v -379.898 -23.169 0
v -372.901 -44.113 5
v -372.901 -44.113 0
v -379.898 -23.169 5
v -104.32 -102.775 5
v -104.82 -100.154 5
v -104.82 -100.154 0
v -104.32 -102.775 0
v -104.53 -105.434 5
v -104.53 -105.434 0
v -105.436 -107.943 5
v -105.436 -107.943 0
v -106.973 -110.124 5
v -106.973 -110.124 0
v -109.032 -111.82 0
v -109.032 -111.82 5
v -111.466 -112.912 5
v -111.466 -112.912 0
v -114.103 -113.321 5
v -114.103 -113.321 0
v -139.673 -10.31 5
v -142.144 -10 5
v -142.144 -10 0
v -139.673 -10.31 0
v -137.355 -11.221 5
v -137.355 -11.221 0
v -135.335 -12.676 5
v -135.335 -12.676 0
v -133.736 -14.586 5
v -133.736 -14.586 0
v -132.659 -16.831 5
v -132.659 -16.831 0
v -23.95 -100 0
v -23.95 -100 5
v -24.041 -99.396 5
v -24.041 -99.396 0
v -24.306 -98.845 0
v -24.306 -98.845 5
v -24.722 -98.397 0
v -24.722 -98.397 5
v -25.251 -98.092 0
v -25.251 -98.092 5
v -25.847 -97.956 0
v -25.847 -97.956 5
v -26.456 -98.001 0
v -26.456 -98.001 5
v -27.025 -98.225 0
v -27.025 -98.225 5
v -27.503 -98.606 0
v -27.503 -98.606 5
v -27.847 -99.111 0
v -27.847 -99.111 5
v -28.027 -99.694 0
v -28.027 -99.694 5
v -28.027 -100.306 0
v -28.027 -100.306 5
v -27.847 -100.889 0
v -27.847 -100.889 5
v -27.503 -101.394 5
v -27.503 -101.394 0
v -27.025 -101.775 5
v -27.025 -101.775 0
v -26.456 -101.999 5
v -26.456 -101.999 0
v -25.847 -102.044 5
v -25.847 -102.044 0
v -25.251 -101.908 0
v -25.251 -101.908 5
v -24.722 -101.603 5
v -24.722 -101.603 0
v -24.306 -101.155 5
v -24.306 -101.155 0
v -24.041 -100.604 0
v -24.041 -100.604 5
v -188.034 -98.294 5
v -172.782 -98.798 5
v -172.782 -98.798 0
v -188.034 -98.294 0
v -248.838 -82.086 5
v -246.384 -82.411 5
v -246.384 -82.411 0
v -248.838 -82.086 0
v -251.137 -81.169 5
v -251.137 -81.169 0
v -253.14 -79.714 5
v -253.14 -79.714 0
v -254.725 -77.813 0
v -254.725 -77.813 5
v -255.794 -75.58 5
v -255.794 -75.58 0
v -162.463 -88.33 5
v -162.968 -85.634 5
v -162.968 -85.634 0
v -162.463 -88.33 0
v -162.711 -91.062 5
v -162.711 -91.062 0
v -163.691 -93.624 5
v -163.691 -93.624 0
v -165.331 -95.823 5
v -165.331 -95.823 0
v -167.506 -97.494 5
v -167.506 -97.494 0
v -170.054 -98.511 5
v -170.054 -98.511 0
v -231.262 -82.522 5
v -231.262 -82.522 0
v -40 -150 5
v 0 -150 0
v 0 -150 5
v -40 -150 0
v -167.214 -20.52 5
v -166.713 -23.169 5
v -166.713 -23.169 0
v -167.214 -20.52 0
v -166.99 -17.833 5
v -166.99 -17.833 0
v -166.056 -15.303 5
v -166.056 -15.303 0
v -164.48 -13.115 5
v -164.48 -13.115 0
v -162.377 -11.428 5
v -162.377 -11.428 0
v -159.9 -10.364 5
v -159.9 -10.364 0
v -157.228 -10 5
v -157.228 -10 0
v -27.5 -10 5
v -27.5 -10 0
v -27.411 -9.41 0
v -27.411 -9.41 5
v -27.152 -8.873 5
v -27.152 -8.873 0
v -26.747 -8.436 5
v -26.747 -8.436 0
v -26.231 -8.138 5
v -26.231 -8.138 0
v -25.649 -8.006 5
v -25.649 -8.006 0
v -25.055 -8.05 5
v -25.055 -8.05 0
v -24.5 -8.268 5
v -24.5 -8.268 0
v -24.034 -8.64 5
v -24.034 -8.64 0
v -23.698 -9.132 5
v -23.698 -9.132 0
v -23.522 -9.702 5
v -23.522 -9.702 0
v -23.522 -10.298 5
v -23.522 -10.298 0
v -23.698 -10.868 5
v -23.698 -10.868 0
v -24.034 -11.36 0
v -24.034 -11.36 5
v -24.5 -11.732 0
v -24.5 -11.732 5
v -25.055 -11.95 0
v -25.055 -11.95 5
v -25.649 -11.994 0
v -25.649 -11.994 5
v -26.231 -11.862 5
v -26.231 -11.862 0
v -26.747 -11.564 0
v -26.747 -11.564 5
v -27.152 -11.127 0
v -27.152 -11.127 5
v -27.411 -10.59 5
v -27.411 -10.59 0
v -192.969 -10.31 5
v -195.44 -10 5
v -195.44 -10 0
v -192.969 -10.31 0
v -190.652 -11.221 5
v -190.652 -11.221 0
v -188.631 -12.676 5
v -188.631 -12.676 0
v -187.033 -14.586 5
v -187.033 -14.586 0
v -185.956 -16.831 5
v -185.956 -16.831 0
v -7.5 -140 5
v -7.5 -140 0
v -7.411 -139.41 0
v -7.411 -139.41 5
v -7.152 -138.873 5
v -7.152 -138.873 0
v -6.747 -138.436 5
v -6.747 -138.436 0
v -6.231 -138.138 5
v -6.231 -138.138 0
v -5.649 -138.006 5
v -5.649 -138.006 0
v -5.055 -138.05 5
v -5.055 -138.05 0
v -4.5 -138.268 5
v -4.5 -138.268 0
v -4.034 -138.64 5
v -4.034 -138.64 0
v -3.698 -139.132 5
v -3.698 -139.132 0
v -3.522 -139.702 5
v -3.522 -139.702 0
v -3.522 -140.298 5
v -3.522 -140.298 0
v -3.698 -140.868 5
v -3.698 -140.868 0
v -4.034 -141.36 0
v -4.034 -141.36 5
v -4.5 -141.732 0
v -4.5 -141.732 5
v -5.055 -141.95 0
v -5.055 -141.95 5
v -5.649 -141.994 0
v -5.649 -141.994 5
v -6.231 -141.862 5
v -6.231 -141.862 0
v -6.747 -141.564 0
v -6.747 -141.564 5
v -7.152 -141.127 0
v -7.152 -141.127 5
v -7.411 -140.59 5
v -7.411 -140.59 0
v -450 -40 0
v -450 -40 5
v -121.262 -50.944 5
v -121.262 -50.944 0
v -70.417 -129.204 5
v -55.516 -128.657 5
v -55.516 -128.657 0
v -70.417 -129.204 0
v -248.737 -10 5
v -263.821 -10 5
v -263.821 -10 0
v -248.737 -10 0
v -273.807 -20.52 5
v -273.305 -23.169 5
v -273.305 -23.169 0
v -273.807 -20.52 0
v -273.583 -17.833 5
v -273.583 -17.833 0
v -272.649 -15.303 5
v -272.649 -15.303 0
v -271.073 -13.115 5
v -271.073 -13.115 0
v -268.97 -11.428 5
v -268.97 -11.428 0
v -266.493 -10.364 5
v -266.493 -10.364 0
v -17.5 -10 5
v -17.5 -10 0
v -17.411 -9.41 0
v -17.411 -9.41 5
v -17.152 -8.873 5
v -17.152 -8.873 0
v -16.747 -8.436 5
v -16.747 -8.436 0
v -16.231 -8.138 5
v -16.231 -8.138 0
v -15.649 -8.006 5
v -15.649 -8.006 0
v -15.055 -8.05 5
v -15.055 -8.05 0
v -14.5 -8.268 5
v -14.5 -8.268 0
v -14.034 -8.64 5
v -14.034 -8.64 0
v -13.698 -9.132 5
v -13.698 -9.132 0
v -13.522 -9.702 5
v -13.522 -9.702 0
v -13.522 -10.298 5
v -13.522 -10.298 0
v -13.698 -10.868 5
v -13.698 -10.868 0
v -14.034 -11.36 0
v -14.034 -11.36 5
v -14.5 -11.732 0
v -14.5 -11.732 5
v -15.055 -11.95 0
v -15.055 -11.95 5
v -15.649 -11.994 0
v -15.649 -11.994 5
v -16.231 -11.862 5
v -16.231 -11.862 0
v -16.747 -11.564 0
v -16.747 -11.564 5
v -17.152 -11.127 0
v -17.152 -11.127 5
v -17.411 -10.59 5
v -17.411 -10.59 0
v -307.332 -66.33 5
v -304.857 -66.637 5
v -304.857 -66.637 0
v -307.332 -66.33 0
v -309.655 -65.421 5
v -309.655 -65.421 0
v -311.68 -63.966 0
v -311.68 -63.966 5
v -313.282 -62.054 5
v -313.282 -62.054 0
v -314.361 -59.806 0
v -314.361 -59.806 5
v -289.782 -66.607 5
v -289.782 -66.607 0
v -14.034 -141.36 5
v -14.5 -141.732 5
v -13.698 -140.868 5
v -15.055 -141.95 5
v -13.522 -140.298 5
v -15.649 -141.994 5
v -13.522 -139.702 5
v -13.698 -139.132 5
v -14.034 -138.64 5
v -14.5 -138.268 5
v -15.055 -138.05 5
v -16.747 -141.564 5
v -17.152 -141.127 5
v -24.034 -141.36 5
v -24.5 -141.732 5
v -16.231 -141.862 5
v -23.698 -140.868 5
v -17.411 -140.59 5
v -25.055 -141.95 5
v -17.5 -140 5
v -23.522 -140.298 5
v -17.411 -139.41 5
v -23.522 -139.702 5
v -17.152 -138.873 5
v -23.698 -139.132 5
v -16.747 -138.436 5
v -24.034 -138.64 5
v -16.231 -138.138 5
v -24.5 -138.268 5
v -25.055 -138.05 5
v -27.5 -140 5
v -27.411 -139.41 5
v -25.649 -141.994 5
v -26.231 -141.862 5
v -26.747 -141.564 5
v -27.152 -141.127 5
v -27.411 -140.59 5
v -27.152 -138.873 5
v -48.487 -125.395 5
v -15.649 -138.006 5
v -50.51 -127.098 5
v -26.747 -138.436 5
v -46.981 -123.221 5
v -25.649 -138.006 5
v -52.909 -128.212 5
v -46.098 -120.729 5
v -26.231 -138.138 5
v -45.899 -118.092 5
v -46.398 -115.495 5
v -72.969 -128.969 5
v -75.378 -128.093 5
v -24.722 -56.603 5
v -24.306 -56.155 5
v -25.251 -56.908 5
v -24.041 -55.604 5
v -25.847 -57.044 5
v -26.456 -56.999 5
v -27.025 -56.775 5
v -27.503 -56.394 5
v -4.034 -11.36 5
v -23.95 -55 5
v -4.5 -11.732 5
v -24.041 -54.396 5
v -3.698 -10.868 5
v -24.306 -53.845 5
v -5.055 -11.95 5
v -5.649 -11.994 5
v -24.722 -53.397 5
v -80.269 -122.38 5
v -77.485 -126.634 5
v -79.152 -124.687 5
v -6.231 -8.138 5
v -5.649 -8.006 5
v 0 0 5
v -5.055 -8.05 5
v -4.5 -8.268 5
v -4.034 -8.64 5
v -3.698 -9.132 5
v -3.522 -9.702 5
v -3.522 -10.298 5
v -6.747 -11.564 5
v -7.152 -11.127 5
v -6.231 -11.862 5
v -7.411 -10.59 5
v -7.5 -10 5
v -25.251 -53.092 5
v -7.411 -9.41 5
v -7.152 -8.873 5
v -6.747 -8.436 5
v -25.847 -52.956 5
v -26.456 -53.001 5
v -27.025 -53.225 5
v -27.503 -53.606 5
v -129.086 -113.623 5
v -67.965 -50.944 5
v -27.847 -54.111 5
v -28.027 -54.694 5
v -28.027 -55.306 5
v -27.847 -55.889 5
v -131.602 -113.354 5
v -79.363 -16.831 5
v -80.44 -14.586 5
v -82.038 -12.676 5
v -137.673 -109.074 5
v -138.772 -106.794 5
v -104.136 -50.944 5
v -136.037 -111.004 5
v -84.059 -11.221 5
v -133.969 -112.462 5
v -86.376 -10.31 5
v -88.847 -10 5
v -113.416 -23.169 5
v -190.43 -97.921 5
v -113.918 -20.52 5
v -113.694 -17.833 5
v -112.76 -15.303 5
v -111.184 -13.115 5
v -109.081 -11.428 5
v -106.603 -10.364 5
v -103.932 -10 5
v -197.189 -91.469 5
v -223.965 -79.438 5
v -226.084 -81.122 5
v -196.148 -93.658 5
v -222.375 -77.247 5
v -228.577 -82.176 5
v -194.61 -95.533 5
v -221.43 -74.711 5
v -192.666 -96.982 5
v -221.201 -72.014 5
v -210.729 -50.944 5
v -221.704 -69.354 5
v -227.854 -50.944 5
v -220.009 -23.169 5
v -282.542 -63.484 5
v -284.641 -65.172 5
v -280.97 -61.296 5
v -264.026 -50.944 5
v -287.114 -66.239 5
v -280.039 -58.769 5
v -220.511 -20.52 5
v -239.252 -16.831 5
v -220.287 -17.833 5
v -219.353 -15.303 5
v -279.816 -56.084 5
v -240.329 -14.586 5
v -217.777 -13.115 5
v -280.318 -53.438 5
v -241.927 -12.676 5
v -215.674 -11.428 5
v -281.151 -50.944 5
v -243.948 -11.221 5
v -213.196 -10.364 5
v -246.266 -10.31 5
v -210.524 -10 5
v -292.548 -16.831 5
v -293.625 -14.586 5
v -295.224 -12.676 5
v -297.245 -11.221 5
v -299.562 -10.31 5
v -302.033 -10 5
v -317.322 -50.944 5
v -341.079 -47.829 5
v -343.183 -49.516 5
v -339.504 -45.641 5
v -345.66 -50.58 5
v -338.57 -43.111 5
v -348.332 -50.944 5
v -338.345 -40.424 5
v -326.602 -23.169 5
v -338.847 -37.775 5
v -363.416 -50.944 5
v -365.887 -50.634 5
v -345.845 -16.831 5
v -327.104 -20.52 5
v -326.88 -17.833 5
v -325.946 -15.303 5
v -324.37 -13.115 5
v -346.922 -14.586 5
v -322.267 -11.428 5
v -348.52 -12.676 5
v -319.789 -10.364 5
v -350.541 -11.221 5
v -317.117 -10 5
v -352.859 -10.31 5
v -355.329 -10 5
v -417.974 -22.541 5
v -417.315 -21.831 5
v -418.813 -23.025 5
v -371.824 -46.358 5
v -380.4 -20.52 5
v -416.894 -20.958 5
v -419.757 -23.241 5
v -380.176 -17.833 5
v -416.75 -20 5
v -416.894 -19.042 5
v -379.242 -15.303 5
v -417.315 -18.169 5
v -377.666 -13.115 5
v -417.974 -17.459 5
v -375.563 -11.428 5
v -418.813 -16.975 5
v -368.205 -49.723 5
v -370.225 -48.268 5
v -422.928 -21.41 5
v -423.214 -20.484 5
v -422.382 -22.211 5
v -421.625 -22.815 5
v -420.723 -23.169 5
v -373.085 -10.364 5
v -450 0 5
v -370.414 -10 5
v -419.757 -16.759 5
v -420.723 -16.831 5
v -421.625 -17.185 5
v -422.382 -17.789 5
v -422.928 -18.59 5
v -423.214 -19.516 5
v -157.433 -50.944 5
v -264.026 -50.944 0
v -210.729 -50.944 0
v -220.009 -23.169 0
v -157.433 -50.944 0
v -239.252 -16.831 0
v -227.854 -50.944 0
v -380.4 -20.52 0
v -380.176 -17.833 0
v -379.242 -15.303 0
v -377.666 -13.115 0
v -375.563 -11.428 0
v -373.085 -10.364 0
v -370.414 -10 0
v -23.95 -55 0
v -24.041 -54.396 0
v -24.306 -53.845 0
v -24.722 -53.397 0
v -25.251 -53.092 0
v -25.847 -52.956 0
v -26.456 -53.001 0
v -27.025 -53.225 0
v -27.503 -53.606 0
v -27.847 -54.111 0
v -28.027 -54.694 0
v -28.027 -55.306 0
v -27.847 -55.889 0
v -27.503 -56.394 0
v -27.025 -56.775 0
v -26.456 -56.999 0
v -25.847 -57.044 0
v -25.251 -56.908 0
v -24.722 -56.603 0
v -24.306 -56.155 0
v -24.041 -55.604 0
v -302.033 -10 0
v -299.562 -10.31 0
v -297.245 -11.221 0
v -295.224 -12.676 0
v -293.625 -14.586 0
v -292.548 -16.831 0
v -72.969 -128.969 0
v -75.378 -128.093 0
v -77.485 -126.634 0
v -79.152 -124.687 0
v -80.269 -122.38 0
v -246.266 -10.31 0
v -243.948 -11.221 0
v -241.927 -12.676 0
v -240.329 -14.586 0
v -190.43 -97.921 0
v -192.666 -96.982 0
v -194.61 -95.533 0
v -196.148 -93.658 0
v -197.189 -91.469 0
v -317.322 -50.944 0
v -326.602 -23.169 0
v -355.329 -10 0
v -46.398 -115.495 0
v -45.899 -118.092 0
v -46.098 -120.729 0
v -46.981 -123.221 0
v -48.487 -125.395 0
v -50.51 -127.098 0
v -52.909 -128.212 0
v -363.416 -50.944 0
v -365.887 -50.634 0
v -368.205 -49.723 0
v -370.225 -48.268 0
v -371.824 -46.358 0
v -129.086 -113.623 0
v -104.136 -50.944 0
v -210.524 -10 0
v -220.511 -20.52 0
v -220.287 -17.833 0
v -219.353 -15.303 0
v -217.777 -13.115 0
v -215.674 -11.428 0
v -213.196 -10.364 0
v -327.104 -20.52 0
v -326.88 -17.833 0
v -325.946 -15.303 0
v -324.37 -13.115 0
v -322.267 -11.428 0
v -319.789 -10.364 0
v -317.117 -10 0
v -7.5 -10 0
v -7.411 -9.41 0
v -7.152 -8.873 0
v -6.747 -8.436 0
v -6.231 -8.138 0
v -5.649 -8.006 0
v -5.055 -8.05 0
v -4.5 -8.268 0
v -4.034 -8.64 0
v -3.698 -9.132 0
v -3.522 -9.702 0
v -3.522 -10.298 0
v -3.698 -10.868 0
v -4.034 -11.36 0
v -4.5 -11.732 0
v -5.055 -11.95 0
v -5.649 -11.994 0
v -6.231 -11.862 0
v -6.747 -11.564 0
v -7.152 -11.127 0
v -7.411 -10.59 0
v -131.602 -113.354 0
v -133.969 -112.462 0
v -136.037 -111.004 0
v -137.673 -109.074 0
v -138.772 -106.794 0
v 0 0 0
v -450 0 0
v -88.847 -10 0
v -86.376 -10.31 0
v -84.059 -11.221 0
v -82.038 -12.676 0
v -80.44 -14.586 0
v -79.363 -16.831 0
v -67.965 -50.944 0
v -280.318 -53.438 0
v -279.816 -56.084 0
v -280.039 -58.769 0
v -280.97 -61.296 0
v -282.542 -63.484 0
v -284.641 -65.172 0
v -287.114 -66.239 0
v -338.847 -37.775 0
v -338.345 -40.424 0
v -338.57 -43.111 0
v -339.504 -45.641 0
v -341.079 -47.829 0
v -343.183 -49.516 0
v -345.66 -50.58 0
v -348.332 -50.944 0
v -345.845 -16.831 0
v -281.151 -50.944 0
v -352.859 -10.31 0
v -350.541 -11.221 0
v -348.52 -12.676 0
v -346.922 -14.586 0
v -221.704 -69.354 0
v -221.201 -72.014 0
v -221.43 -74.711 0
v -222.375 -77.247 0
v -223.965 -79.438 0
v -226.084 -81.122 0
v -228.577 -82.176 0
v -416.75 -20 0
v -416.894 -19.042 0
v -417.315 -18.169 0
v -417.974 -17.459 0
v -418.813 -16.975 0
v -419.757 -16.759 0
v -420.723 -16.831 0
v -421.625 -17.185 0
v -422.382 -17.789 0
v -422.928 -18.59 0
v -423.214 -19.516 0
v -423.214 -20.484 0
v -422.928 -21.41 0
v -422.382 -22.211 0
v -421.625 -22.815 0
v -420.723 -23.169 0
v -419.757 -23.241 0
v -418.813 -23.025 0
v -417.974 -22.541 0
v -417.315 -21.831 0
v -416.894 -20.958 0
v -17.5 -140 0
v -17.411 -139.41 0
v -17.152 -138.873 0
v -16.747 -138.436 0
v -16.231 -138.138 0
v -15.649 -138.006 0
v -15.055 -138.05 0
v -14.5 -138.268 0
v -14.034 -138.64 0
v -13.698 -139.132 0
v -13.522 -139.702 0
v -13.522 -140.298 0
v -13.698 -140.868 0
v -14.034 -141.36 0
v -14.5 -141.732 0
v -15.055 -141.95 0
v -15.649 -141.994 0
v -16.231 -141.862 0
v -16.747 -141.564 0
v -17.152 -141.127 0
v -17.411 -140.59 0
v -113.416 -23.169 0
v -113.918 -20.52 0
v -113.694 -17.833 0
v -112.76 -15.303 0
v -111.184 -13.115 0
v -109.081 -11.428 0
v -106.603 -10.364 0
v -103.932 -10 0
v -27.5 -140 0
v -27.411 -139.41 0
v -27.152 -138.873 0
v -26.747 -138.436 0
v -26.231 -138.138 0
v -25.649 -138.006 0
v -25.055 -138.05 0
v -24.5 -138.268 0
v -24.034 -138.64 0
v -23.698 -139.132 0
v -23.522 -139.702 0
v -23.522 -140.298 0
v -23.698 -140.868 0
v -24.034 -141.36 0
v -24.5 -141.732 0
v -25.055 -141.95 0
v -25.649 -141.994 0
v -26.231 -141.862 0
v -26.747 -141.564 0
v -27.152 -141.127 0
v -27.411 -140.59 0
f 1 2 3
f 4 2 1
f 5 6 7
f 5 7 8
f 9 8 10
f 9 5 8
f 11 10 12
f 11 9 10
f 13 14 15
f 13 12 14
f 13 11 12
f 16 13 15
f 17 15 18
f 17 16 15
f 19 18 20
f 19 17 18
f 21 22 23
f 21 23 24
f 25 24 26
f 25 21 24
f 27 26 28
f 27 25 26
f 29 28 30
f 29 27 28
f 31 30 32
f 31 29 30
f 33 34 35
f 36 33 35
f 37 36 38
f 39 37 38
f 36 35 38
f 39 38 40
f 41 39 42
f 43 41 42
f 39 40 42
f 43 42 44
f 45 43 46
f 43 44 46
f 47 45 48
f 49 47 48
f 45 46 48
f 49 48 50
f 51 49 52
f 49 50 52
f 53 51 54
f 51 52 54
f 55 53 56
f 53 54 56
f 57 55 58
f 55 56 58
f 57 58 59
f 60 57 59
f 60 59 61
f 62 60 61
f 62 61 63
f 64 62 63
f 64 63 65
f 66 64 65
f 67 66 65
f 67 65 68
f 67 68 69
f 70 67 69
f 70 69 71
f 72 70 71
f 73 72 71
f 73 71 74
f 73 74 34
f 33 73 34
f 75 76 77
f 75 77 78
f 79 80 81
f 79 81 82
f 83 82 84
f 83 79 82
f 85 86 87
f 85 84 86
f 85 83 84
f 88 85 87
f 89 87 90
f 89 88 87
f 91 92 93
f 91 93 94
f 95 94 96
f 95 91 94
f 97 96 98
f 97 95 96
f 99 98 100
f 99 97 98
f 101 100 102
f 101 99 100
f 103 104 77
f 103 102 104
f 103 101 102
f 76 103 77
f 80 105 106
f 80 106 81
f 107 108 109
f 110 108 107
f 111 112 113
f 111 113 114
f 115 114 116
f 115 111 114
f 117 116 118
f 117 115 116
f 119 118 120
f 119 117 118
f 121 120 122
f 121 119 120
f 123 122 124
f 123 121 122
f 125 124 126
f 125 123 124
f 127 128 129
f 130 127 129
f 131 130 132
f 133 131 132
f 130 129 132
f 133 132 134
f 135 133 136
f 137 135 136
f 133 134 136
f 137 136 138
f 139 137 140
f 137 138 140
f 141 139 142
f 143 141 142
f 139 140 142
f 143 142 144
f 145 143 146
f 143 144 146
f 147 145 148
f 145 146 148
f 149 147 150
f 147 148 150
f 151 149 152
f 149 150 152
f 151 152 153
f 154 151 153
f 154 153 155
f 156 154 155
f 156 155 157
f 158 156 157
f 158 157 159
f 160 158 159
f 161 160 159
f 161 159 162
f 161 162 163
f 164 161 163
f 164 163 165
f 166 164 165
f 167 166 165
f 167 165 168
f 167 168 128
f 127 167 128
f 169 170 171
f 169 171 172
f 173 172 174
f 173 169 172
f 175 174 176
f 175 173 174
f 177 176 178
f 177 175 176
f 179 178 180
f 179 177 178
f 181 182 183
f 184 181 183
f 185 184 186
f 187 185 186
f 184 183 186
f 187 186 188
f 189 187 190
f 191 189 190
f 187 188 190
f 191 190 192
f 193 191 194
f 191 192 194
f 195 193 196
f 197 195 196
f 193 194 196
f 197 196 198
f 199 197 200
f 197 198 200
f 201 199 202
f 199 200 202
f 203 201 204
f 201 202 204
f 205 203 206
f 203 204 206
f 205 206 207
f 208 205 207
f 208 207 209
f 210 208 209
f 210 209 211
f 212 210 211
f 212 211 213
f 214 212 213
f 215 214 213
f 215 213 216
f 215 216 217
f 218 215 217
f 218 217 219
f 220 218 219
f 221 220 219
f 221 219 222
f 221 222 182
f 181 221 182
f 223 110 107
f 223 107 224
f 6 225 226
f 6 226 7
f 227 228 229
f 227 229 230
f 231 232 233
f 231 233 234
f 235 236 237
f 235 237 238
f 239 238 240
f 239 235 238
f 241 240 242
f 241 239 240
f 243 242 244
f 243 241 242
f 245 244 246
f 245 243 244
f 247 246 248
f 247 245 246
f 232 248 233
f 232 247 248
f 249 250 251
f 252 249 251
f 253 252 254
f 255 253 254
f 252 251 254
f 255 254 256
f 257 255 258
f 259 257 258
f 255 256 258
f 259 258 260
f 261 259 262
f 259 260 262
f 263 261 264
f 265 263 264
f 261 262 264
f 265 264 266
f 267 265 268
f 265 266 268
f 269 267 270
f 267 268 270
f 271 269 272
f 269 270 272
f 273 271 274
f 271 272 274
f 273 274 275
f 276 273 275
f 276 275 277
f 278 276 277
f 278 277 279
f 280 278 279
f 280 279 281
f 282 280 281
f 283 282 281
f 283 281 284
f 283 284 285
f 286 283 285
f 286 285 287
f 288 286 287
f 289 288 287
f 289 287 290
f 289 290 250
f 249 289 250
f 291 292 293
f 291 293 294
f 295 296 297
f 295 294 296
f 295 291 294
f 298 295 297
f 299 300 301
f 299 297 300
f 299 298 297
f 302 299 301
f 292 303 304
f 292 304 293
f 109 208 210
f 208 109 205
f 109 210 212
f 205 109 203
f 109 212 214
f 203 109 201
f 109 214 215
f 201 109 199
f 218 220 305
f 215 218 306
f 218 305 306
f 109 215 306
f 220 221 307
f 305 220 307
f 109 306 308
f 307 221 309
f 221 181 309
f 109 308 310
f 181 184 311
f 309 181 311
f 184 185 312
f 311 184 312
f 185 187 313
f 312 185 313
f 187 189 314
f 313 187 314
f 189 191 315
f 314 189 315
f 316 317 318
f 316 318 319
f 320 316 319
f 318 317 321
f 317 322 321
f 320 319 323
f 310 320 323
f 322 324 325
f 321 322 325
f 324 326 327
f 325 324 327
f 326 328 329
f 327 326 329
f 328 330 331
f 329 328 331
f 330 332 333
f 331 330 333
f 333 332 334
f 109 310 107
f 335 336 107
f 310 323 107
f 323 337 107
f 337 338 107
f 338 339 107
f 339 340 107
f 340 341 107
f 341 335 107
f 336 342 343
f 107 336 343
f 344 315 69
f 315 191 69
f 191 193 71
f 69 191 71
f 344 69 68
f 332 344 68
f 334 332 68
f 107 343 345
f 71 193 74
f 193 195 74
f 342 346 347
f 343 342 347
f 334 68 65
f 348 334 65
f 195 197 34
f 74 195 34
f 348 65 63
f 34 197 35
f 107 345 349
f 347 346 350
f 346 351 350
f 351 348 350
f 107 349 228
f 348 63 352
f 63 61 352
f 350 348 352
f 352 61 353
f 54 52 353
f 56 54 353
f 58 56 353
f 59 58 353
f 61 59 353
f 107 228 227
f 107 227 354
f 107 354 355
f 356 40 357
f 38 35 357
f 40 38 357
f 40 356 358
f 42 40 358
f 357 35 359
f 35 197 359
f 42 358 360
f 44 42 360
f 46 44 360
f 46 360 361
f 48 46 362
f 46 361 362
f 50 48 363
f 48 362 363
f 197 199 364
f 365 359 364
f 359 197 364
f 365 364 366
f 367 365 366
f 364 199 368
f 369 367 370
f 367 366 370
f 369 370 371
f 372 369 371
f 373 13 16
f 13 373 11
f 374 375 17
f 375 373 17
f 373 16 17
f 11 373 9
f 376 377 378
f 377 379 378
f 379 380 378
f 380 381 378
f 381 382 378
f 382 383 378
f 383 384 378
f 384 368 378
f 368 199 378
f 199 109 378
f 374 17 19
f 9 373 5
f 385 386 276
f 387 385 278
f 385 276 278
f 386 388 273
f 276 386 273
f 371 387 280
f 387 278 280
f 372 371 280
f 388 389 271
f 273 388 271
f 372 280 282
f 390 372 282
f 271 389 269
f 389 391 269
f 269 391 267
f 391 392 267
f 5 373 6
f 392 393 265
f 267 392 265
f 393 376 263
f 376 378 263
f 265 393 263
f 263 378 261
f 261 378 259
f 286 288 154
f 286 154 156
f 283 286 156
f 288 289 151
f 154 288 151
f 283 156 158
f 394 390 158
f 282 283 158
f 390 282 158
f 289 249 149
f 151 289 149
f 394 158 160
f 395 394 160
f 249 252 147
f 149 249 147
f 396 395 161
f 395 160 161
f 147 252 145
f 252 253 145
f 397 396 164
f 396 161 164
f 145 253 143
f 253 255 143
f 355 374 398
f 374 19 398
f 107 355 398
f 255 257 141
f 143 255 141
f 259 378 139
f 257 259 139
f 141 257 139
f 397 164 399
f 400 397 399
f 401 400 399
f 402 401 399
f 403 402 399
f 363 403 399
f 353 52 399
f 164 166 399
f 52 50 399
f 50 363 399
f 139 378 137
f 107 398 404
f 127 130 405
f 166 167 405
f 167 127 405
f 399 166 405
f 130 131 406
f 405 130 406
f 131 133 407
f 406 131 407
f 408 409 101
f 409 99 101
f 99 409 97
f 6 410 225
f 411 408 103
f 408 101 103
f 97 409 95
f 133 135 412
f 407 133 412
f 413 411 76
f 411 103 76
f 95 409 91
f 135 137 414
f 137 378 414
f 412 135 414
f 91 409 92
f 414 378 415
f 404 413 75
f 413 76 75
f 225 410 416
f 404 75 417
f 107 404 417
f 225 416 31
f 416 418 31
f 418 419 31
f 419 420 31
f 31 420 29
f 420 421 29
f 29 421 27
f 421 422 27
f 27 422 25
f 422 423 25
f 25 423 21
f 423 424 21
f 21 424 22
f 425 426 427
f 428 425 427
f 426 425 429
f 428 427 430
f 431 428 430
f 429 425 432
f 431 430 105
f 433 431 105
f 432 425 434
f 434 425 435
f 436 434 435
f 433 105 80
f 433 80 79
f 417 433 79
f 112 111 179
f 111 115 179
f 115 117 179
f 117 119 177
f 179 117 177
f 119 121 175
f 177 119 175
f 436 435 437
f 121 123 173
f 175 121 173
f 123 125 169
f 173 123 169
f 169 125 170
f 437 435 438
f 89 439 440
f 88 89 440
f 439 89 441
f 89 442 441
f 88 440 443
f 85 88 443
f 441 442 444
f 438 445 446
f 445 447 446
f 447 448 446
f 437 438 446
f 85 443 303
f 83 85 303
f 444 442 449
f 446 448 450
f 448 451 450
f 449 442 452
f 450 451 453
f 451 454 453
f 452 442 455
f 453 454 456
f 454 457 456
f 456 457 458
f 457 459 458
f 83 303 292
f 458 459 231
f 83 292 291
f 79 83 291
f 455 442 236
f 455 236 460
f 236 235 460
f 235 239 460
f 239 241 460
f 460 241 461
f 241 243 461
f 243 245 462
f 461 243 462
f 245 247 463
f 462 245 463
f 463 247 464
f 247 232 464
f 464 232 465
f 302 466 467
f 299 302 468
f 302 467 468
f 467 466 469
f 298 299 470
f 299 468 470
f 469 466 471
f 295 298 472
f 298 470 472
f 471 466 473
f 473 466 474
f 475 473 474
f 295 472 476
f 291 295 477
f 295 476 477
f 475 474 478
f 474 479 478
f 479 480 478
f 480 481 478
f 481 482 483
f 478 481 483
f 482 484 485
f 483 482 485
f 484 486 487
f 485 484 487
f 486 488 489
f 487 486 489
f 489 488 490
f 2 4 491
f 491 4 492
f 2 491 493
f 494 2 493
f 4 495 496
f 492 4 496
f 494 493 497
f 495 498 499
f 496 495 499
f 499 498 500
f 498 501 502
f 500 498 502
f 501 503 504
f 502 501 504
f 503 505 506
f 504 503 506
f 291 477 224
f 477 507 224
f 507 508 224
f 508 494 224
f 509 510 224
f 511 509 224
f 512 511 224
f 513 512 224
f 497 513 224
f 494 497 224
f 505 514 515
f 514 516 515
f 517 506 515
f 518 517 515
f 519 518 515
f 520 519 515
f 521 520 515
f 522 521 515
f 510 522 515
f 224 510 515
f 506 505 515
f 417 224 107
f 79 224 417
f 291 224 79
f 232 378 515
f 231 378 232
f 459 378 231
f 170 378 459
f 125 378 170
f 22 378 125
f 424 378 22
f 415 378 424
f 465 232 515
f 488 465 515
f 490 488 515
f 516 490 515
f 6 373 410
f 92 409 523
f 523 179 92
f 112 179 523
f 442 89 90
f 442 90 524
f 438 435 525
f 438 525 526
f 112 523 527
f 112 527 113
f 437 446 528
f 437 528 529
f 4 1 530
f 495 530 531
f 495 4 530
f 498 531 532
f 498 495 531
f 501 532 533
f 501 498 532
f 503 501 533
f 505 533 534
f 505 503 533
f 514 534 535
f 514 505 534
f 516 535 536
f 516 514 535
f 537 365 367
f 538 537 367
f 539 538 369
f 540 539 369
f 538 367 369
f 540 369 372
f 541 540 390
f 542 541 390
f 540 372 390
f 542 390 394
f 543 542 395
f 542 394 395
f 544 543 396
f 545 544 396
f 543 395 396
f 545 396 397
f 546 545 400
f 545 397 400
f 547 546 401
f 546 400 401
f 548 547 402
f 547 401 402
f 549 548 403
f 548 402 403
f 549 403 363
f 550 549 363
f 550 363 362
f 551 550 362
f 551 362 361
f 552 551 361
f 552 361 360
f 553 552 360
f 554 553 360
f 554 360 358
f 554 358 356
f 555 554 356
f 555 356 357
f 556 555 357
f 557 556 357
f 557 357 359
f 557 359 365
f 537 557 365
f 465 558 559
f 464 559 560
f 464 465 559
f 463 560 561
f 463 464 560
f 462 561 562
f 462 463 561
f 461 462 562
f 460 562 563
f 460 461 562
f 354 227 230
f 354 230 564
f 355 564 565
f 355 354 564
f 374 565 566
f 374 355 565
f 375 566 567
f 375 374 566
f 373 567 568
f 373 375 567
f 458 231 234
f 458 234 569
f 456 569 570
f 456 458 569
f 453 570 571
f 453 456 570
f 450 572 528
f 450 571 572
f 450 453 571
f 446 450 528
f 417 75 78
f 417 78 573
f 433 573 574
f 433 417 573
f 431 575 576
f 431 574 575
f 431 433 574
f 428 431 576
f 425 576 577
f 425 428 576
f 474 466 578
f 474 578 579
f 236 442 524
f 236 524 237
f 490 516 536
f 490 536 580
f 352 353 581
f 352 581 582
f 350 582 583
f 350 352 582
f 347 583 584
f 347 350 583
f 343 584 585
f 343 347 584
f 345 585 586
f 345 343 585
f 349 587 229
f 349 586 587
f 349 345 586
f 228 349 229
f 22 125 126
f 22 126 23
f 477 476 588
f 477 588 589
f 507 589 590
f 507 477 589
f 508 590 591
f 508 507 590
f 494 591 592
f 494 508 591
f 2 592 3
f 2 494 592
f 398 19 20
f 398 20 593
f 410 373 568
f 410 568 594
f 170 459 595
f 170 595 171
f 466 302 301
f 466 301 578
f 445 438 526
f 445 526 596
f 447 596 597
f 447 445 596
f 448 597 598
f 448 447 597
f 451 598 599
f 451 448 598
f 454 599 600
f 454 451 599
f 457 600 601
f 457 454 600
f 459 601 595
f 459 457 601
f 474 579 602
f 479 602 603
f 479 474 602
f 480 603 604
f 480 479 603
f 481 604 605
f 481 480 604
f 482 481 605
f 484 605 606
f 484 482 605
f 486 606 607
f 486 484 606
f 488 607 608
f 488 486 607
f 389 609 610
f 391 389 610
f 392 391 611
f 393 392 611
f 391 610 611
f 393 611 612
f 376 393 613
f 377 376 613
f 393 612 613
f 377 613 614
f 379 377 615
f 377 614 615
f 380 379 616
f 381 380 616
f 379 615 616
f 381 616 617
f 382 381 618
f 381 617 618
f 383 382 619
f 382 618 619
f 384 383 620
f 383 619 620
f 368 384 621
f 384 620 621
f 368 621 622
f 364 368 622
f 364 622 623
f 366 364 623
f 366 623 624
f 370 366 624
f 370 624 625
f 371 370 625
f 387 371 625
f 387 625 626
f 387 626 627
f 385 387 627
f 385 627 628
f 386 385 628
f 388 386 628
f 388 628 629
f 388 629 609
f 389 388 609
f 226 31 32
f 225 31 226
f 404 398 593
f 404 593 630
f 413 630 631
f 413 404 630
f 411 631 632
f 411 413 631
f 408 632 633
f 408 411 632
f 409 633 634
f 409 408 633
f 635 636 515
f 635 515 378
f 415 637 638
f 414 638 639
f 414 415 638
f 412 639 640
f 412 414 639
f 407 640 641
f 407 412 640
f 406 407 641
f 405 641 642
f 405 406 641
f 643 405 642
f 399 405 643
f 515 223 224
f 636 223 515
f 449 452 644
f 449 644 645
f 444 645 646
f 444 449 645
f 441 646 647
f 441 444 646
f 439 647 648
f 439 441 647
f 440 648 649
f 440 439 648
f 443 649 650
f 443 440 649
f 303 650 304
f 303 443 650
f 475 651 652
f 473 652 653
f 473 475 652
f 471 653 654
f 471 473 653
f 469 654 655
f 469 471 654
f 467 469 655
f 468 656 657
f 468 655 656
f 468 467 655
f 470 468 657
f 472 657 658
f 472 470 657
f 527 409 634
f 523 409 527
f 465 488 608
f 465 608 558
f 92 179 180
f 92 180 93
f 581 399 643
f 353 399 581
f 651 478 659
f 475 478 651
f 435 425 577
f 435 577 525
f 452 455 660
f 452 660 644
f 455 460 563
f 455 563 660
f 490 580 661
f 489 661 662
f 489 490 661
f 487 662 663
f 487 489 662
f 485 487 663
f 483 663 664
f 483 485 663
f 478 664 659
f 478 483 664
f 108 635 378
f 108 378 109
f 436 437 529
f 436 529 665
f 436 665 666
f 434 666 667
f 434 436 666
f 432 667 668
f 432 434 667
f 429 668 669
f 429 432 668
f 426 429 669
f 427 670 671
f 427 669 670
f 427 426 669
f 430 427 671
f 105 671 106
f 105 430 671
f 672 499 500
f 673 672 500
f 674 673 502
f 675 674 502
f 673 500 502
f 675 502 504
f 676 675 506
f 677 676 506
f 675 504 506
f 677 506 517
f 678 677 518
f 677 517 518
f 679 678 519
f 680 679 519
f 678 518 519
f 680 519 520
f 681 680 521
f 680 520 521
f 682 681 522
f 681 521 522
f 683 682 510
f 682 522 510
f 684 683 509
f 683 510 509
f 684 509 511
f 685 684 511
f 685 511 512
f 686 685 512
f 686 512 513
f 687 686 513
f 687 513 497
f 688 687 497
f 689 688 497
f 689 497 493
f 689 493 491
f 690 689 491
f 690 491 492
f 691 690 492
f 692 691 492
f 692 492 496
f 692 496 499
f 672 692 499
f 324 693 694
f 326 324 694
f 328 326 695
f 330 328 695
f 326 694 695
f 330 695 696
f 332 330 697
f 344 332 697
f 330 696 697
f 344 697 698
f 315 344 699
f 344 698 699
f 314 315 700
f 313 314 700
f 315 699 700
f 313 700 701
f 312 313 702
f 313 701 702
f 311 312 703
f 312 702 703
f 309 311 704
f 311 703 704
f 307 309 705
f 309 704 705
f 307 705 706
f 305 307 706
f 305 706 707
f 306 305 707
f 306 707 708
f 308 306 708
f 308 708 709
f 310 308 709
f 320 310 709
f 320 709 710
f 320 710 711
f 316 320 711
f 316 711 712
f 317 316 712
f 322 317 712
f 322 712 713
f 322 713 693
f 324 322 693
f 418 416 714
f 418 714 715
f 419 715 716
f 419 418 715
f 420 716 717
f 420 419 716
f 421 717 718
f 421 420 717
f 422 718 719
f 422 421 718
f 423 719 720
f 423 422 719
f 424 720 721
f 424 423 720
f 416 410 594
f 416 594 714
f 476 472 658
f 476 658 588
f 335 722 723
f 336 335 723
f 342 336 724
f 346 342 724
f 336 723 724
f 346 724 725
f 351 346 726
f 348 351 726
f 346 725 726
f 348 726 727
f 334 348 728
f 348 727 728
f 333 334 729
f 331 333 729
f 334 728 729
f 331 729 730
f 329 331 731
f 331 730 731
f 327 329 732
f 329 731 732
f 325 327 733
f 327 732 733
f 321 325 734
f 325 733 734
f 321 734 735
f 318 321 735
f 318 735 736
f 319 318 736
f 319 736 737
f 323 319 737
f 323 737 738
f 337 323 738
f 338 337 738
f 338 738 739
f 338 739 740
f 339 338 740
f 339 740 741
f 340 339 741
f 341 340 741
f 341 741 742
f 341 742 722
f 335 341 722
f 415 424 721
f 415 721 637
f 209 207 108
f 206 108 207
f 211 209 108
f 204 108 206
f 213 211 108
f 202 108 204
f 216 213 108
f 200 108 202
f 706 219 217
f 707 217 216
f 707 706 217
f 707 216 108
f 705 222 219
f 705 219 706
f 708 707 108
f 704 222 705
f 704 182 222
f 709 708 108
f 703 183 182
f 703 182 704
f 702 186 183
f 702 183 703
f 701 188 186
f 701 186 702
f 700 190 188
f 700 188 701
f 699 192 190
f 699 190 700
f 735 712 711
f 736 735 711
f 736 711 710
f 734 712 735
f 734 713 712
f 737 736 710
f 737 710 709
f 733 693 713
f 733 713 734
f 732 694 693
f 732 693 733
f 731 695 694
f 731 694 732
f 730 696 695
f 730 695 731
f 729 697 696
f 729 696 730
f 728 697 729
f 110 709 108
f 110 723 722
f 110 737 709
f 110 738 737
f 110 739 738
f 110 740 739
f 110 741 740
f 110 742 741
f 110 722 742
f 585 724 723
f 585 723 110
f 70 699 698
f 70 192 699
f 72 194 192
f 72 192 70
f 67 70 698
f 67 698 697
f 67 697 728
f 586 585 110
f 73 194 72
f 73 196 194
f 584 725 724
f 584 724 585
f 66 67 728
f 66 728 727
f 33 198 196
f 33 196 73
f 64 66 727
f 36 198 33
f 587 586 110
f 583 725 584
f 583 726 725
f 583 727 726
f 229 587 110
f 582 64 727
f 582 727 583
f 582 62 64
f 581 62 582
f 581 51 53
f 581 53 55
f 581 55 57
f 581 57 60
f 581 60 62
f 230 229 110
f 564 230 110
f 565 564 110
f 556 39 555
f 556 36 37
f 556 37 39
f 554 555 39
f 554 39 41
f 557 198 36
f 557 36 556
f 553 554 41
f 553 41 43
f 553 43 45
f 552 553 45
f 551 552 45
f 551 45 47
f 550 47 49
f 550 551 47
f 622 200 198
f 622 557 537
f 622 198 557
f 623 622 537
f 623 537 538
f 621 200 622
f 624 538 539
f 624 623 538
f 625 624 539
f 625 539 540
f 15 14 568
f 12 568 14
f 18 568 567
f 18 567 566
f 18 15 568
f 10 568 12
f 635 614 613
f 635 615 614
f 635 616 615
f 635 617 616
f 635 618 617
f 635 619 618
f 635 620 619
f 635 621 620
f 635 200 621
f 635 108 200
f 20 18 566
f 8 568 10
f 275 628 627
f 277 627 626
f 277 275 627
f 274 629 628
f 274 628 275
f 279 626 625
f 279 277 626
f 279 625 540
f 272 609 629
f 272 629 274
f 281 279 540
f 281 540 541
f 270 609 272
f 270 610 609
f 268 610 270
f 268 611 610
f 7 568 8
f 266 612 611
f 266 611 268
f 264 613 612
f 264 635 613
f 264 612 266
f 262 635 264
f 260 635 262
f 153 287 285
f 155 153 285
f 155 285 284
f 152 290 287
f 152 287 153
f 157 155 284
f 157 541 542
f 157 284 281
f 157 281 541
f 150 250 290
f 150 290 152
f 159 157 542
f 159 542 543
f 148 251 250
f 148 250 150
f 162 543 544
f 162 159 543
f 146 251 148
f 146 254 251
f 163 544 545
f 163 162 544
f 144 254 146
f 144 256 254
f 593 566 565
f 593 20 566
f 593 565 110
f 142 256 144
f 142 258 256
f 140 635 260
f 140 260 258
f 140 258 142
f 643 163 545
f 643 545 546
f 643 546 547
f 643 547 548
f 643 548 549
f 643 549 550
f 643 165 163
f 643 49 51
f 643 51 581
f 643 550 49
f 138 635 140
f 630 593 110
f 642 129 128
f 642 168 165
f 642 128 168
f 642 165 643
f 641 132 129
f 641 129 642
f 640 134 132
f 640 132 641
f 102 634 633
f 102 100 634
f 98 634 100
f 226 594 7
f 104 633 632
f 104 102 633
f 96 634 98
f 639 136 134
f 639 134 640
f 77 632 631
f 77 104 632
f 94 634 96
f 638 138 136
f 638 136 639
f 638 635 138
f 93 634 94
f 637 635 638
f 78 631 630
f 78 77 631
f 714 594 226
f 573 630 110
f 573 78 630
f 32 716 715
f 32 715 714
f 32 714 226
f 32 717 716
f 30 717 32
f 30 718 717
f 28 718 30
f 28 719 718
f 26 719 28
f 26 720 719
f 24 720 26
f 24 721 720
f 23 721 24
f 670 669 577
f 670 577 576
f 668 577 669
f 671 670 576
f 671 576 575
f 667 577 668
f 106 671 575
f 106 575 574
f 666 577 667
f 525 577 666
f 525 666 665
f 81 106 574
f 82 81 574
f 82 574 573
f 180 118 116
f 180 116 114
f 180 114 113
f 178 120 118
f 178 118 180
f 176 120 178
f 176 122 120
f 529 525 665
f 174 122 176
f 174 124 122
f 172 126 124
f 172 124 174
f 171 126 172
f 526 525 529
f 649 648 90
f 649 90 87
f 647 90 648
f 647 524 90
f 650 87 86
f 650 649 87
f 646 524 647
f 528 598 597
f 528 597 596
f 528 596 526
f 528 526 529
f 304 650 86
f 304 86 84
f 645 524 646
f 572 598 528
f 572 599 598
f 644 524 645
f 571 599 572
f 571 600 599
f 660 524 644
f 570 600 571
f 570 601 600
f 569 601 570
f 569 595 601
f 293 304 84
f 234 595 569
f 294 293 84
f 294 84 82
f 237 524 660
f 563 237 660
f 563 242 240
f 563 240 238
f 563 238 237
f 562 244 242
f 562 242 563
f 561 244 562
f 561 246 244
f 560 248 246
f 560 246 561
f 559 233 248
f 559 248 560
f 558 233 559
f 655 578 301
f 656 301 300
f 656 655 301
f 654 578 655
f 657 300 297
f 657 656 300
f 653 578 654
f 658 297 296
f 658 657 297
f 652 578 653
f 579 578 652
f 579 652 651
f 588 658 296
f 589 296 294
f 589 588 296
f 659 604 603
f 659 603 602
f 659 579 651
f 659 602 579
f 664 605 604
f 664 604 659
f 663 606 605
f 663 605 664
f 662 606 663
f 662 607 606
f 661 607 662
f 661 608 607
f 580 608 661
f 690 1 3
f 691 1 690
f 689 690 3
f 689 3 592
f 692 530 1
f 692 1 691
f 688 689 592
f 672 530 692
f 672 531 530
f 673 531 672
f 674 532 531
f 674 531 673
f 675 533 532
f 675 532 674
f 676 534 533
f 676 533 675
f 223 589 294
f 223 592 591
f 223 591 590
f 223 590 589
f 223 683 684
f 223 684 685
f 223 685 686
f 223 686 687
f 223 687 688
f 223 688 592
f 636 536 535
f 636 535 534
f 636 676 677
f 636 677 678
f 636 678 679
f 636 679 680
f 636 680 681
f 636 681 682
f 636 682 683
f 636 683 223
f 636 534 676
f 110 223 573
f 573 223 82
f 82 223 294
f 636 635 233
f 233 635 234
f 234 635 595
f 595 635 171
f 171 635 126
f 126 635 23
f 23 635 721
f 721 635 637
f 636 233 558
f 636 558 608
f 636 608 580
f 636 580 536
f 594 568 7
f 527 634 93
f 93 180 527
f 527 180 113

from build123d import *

# Parameters (mm, degrees)
AUFSATZ_LINEAR_AUSTRAGEN1_DEPTH  = 5
SKIZZE2_R                        = 3.25
SCHNITT_LINEAR_AUSTRAGEN1_DEPTH  = 6
F_4_0_4_DURCHMESSER_BOHRUNG1_D   = 4
F_4_1_4_1_DURCHMESSER_BOHRUNG1_D = 4.1
SCHNITT_LINEAR_AUSTRAGEN2_DEPTH  = 8


with BuildPart() as part:
    # Skizze1 → Aufsatz-Linear austragen1 (new body)
    with BuildSketch(Plane.XY):
        Polygon((0, 0), (0, -150), (-40, -150), (-450, -40), (-450, 0), align=None)
    extrude(amount=AUFSATZ_LINEAR_AUSTRAGEN1_DEPTH)

    # Skizze2 → Schnitt-Linear austragen1 (cut, through all)
    with BuildSketch(Plane.XY.offset(5)):
        with Locations((-420, -20)):
            Circle(SKIZZE2_R)
    extrude(amount=-SCHNITT_LINEAR_AUSTRAGEN1_DEPTH, mode=Mode.SUBTRACT)

    # Ø4.0 (4) Durchmesser Bohrung1 (through all)
    with Locations(Plane.XY.offset(5)):
        with Locations((-25.5, -10), (-15.5, -10), (-5.5, -10), (-5.5, -140), (-15.5, -140), (-25.5, -140)):
            Hole(F_4_0_4_DURCHMESSER_BOHRUNG1_D / 2)

    # Ø4.1 (4.1) Durchmesser Bohrung1 (through all)
    with Locations(Plane(origin=(0, 0, 0), x_dir=(-1, 0, 0), z_dir=(0, 0, -1))):
        with Locations((26, -55), (26, -100)):
            Hole(F_4_1_4_1_DURCHMESSER_BOHRUNG1_D / 2)

    # Skizze9 → Schnitt-Linear austragen2 (cut)
    with BuildSketch(Plane.XY.offset(5)):
        with BuildLine():
            Line((-103.931576355, -10), (-88.847327603, -10))
            ThreePointArc((-88.847327603, -10), (-83.003068108, -11.885529533), (-79.362713389, -16.831073809))
            Line((-79.362713389, -16.831073809), (-67.965211215, -50.943863007))
            Line((-67.965211215, -50.943863007), (-46.397909384, -115.49492075))
            ThreePointArc((-46.397909384, -115.49492075), (-47.662174175, -124.358217438), (-55.515574608, -128.657112095))
            Line((-55.515574608, -128.657112095), (-70.41700546, -129.20428711))
            ThreePointArc((-70.41700546, -129.20428711), (-76.478324948, -127.43137138), (-80.268568666, -122.379948147))
            Line((-80.268568666, -122.379948147), (-104.136242779, -50.943863007))
            Line((-104.136242779, -50.943863007), (-113.416190569, -23.168926191))
            ThreePointArc((-113.416190569, -23.168926191), (-112.046046821, -14.155740505), (-103.931576355, -10))
        make_face()
        with BuildLine():
            Line((-132.659135945, -16.831073809), (-121.261633772, -50.943863007))
            Line((-121.261633772, -50.943863007), (-104.819891238, -100.154092454))
            ThreePointArc((-104.819891238, -100.154092454), (-106.1314685, -109.085090058), (-114.102677631, -113.320981714))
            Line((-114.102677631, -113.320981714), (-129.085869406, -113.62344582))
            ThreePointArc((-129.085869406, -113.62344582), (-135.049768642, -111.798519703), (-138.772311443, -106.794408942))
            Line((-138.772311443, -106.794408942), (-157.432665335, -50.943863007))
            Line((-157.432665335, -50.943863007), (-166.712613125, -23.168926191))
            ThreePointArc((-166.712613125, -23.168926191), (-165.342469378, -14.155740505), (-157.227998911, -10))
            Line((-157.227998911, -10), (-142.14375016, -10))
            ThreePointArc((-142.14375016, -10), (-136.299490665, -11.885529533), (-132.659135945, -16.831073809))
        make_face()
        with BuildLine():
            Line((-185.955558502, -16.831073809), (-174.558056328, -50.943863007))
            Line((-174.558056328, -50.943863007), (-162.967615916, -85.634117455))
            ThreePointArc((-162.967615916, -85.634117455), (-164.435252335, -94.780339607), (-172.782043853, -98.797603311))
            Line((-172.782043853, -98.797603311), (-188.034457791, -98.294283947))
            ThreePointArc((-188.034457791, -98.294283947), (-193.68194003, -96.316702077), (-197.189258283, -91.468650472))
            Line((-197.189258283, -91.468650472), (-210.729087892, -50.943863007))
            Line((-210.729087892, -50.943863007), (-220.009035682, -23.168926191))
            ThreePointArc((-220.009035682, -23.168926191), (-218.638891934, -14.155740505), (-210.524421467, -10))
            Line((-210.524421467, -10), (-195.440172716, -10))
            ThreePointArc((-195.440172716, -10), (-189.595913221, -11.885529533), (-185.955558502, -16.831073809))
        make_face()
        with BuildLine():
            Line((-239.251981058, -16.831073809), (-227.854478884, -50.943863007))
            Line((-227.854478884, -50.943863007), (-221.703520719, -69.353715979))
            ThreePointArc((-221.703520719, -69.353715979), (-223.095303096, -78.396829164), (-231.261995944, -82.522369394))
            Line((-231.261995944, -82.522369394), (-246.383562521, -82.410676928))
            ThreePointArc((-246.383562521, -82.410676928), (-252.183888505, -80.503781541), (-255.794315725, -75.579875894))
            Line((-255.794315725, -75.579875894), (-264.025510448, -50.943863007))
            Line((-264.025510448, -50.943863007), (-273.305458238, -23.168926191))
            ThreePointArc((-273.305458238, -23.168926191), (-271.93531449, -14.155740505), (-263.820844024, -10))
            Line((-263.820844024, -10), (-248.736595273, -10))
            ThreePointArc((-248.736595273, -10), (-242.892335777, -11.885529533), (-239.251981058, -16.831073809))
        make_face()
        with BuildLine():
            Line((-292.548403615, -16.831073809), (-281.150901441, -50.943863007))
            Line((-281.150901441, -50.943863007), (-280.31760719, -53.437917466))
            ThreePointArc((-280.31760719, -53.437917466), (-281.68198, -62.443082132), (-289.782458776, -66.606824129))
            Line((-289.782458776, -66.606824129), (-304.856754045, -66.636614958))
            ThreePointArc((-304.856754045, -66.636614958), (-310.712755148, -64.75687589), (-314.361130888, -59.805560676))
            Line((-314.361130888, -59.805560676), (-317.321933004, -50.943863007))
            Line((-317.321933004, -50.943863007), (-326.601880795, -23.168926191))
            ThreePointArc((-326.601880795, -23.168926191), (-325.231737047, -14.155740505), (-317.11726658, -10))
            Line((-317.11726658, -10), (-302.033017829, -10))
            ThreePointArc((-302.033017829, -10), (-296.188758334, -11.885529533), (-292.548403615, -16.831073809))
        make_face()
        with BuildLine():
            Line((-345.844826171, -16.831073809), (-338.847224106, -37.774936817))
            ThreePointArc((-338.847224106, -37.774936817), (-340.217367853, -46.788122502), (-348.33183832, -50.943863007))
            Line((-348.33183832, -50.943863007), (-363.416087071, -50.943863007))
            ThreePointArc((-363.416087071, -50.943863007), (-369.260346566, -49.058333474), (-372.900701286, -44.112789198))
            Line((-372.900701286, -44.112789198), (-379.898303351, -23.168926191))
            ThreePointArc((-379.898303351, -23.168926191), (-378.528159603, -14.155740505), (-370.413689137, -10))
            Line((-370.413689137, -10), (-355.329440386, -10))
            ThreePointArc((-355.329440386, -10), (-349.48518089, -11.885529533), (-345.844826171, -16.831073809))
        make_face()
    extrude(amount=-SCHNITT_LINEAR_AUSTRAGEN2_DEPTH, mode=Mode.SUBTRACT)


solid = part.part
